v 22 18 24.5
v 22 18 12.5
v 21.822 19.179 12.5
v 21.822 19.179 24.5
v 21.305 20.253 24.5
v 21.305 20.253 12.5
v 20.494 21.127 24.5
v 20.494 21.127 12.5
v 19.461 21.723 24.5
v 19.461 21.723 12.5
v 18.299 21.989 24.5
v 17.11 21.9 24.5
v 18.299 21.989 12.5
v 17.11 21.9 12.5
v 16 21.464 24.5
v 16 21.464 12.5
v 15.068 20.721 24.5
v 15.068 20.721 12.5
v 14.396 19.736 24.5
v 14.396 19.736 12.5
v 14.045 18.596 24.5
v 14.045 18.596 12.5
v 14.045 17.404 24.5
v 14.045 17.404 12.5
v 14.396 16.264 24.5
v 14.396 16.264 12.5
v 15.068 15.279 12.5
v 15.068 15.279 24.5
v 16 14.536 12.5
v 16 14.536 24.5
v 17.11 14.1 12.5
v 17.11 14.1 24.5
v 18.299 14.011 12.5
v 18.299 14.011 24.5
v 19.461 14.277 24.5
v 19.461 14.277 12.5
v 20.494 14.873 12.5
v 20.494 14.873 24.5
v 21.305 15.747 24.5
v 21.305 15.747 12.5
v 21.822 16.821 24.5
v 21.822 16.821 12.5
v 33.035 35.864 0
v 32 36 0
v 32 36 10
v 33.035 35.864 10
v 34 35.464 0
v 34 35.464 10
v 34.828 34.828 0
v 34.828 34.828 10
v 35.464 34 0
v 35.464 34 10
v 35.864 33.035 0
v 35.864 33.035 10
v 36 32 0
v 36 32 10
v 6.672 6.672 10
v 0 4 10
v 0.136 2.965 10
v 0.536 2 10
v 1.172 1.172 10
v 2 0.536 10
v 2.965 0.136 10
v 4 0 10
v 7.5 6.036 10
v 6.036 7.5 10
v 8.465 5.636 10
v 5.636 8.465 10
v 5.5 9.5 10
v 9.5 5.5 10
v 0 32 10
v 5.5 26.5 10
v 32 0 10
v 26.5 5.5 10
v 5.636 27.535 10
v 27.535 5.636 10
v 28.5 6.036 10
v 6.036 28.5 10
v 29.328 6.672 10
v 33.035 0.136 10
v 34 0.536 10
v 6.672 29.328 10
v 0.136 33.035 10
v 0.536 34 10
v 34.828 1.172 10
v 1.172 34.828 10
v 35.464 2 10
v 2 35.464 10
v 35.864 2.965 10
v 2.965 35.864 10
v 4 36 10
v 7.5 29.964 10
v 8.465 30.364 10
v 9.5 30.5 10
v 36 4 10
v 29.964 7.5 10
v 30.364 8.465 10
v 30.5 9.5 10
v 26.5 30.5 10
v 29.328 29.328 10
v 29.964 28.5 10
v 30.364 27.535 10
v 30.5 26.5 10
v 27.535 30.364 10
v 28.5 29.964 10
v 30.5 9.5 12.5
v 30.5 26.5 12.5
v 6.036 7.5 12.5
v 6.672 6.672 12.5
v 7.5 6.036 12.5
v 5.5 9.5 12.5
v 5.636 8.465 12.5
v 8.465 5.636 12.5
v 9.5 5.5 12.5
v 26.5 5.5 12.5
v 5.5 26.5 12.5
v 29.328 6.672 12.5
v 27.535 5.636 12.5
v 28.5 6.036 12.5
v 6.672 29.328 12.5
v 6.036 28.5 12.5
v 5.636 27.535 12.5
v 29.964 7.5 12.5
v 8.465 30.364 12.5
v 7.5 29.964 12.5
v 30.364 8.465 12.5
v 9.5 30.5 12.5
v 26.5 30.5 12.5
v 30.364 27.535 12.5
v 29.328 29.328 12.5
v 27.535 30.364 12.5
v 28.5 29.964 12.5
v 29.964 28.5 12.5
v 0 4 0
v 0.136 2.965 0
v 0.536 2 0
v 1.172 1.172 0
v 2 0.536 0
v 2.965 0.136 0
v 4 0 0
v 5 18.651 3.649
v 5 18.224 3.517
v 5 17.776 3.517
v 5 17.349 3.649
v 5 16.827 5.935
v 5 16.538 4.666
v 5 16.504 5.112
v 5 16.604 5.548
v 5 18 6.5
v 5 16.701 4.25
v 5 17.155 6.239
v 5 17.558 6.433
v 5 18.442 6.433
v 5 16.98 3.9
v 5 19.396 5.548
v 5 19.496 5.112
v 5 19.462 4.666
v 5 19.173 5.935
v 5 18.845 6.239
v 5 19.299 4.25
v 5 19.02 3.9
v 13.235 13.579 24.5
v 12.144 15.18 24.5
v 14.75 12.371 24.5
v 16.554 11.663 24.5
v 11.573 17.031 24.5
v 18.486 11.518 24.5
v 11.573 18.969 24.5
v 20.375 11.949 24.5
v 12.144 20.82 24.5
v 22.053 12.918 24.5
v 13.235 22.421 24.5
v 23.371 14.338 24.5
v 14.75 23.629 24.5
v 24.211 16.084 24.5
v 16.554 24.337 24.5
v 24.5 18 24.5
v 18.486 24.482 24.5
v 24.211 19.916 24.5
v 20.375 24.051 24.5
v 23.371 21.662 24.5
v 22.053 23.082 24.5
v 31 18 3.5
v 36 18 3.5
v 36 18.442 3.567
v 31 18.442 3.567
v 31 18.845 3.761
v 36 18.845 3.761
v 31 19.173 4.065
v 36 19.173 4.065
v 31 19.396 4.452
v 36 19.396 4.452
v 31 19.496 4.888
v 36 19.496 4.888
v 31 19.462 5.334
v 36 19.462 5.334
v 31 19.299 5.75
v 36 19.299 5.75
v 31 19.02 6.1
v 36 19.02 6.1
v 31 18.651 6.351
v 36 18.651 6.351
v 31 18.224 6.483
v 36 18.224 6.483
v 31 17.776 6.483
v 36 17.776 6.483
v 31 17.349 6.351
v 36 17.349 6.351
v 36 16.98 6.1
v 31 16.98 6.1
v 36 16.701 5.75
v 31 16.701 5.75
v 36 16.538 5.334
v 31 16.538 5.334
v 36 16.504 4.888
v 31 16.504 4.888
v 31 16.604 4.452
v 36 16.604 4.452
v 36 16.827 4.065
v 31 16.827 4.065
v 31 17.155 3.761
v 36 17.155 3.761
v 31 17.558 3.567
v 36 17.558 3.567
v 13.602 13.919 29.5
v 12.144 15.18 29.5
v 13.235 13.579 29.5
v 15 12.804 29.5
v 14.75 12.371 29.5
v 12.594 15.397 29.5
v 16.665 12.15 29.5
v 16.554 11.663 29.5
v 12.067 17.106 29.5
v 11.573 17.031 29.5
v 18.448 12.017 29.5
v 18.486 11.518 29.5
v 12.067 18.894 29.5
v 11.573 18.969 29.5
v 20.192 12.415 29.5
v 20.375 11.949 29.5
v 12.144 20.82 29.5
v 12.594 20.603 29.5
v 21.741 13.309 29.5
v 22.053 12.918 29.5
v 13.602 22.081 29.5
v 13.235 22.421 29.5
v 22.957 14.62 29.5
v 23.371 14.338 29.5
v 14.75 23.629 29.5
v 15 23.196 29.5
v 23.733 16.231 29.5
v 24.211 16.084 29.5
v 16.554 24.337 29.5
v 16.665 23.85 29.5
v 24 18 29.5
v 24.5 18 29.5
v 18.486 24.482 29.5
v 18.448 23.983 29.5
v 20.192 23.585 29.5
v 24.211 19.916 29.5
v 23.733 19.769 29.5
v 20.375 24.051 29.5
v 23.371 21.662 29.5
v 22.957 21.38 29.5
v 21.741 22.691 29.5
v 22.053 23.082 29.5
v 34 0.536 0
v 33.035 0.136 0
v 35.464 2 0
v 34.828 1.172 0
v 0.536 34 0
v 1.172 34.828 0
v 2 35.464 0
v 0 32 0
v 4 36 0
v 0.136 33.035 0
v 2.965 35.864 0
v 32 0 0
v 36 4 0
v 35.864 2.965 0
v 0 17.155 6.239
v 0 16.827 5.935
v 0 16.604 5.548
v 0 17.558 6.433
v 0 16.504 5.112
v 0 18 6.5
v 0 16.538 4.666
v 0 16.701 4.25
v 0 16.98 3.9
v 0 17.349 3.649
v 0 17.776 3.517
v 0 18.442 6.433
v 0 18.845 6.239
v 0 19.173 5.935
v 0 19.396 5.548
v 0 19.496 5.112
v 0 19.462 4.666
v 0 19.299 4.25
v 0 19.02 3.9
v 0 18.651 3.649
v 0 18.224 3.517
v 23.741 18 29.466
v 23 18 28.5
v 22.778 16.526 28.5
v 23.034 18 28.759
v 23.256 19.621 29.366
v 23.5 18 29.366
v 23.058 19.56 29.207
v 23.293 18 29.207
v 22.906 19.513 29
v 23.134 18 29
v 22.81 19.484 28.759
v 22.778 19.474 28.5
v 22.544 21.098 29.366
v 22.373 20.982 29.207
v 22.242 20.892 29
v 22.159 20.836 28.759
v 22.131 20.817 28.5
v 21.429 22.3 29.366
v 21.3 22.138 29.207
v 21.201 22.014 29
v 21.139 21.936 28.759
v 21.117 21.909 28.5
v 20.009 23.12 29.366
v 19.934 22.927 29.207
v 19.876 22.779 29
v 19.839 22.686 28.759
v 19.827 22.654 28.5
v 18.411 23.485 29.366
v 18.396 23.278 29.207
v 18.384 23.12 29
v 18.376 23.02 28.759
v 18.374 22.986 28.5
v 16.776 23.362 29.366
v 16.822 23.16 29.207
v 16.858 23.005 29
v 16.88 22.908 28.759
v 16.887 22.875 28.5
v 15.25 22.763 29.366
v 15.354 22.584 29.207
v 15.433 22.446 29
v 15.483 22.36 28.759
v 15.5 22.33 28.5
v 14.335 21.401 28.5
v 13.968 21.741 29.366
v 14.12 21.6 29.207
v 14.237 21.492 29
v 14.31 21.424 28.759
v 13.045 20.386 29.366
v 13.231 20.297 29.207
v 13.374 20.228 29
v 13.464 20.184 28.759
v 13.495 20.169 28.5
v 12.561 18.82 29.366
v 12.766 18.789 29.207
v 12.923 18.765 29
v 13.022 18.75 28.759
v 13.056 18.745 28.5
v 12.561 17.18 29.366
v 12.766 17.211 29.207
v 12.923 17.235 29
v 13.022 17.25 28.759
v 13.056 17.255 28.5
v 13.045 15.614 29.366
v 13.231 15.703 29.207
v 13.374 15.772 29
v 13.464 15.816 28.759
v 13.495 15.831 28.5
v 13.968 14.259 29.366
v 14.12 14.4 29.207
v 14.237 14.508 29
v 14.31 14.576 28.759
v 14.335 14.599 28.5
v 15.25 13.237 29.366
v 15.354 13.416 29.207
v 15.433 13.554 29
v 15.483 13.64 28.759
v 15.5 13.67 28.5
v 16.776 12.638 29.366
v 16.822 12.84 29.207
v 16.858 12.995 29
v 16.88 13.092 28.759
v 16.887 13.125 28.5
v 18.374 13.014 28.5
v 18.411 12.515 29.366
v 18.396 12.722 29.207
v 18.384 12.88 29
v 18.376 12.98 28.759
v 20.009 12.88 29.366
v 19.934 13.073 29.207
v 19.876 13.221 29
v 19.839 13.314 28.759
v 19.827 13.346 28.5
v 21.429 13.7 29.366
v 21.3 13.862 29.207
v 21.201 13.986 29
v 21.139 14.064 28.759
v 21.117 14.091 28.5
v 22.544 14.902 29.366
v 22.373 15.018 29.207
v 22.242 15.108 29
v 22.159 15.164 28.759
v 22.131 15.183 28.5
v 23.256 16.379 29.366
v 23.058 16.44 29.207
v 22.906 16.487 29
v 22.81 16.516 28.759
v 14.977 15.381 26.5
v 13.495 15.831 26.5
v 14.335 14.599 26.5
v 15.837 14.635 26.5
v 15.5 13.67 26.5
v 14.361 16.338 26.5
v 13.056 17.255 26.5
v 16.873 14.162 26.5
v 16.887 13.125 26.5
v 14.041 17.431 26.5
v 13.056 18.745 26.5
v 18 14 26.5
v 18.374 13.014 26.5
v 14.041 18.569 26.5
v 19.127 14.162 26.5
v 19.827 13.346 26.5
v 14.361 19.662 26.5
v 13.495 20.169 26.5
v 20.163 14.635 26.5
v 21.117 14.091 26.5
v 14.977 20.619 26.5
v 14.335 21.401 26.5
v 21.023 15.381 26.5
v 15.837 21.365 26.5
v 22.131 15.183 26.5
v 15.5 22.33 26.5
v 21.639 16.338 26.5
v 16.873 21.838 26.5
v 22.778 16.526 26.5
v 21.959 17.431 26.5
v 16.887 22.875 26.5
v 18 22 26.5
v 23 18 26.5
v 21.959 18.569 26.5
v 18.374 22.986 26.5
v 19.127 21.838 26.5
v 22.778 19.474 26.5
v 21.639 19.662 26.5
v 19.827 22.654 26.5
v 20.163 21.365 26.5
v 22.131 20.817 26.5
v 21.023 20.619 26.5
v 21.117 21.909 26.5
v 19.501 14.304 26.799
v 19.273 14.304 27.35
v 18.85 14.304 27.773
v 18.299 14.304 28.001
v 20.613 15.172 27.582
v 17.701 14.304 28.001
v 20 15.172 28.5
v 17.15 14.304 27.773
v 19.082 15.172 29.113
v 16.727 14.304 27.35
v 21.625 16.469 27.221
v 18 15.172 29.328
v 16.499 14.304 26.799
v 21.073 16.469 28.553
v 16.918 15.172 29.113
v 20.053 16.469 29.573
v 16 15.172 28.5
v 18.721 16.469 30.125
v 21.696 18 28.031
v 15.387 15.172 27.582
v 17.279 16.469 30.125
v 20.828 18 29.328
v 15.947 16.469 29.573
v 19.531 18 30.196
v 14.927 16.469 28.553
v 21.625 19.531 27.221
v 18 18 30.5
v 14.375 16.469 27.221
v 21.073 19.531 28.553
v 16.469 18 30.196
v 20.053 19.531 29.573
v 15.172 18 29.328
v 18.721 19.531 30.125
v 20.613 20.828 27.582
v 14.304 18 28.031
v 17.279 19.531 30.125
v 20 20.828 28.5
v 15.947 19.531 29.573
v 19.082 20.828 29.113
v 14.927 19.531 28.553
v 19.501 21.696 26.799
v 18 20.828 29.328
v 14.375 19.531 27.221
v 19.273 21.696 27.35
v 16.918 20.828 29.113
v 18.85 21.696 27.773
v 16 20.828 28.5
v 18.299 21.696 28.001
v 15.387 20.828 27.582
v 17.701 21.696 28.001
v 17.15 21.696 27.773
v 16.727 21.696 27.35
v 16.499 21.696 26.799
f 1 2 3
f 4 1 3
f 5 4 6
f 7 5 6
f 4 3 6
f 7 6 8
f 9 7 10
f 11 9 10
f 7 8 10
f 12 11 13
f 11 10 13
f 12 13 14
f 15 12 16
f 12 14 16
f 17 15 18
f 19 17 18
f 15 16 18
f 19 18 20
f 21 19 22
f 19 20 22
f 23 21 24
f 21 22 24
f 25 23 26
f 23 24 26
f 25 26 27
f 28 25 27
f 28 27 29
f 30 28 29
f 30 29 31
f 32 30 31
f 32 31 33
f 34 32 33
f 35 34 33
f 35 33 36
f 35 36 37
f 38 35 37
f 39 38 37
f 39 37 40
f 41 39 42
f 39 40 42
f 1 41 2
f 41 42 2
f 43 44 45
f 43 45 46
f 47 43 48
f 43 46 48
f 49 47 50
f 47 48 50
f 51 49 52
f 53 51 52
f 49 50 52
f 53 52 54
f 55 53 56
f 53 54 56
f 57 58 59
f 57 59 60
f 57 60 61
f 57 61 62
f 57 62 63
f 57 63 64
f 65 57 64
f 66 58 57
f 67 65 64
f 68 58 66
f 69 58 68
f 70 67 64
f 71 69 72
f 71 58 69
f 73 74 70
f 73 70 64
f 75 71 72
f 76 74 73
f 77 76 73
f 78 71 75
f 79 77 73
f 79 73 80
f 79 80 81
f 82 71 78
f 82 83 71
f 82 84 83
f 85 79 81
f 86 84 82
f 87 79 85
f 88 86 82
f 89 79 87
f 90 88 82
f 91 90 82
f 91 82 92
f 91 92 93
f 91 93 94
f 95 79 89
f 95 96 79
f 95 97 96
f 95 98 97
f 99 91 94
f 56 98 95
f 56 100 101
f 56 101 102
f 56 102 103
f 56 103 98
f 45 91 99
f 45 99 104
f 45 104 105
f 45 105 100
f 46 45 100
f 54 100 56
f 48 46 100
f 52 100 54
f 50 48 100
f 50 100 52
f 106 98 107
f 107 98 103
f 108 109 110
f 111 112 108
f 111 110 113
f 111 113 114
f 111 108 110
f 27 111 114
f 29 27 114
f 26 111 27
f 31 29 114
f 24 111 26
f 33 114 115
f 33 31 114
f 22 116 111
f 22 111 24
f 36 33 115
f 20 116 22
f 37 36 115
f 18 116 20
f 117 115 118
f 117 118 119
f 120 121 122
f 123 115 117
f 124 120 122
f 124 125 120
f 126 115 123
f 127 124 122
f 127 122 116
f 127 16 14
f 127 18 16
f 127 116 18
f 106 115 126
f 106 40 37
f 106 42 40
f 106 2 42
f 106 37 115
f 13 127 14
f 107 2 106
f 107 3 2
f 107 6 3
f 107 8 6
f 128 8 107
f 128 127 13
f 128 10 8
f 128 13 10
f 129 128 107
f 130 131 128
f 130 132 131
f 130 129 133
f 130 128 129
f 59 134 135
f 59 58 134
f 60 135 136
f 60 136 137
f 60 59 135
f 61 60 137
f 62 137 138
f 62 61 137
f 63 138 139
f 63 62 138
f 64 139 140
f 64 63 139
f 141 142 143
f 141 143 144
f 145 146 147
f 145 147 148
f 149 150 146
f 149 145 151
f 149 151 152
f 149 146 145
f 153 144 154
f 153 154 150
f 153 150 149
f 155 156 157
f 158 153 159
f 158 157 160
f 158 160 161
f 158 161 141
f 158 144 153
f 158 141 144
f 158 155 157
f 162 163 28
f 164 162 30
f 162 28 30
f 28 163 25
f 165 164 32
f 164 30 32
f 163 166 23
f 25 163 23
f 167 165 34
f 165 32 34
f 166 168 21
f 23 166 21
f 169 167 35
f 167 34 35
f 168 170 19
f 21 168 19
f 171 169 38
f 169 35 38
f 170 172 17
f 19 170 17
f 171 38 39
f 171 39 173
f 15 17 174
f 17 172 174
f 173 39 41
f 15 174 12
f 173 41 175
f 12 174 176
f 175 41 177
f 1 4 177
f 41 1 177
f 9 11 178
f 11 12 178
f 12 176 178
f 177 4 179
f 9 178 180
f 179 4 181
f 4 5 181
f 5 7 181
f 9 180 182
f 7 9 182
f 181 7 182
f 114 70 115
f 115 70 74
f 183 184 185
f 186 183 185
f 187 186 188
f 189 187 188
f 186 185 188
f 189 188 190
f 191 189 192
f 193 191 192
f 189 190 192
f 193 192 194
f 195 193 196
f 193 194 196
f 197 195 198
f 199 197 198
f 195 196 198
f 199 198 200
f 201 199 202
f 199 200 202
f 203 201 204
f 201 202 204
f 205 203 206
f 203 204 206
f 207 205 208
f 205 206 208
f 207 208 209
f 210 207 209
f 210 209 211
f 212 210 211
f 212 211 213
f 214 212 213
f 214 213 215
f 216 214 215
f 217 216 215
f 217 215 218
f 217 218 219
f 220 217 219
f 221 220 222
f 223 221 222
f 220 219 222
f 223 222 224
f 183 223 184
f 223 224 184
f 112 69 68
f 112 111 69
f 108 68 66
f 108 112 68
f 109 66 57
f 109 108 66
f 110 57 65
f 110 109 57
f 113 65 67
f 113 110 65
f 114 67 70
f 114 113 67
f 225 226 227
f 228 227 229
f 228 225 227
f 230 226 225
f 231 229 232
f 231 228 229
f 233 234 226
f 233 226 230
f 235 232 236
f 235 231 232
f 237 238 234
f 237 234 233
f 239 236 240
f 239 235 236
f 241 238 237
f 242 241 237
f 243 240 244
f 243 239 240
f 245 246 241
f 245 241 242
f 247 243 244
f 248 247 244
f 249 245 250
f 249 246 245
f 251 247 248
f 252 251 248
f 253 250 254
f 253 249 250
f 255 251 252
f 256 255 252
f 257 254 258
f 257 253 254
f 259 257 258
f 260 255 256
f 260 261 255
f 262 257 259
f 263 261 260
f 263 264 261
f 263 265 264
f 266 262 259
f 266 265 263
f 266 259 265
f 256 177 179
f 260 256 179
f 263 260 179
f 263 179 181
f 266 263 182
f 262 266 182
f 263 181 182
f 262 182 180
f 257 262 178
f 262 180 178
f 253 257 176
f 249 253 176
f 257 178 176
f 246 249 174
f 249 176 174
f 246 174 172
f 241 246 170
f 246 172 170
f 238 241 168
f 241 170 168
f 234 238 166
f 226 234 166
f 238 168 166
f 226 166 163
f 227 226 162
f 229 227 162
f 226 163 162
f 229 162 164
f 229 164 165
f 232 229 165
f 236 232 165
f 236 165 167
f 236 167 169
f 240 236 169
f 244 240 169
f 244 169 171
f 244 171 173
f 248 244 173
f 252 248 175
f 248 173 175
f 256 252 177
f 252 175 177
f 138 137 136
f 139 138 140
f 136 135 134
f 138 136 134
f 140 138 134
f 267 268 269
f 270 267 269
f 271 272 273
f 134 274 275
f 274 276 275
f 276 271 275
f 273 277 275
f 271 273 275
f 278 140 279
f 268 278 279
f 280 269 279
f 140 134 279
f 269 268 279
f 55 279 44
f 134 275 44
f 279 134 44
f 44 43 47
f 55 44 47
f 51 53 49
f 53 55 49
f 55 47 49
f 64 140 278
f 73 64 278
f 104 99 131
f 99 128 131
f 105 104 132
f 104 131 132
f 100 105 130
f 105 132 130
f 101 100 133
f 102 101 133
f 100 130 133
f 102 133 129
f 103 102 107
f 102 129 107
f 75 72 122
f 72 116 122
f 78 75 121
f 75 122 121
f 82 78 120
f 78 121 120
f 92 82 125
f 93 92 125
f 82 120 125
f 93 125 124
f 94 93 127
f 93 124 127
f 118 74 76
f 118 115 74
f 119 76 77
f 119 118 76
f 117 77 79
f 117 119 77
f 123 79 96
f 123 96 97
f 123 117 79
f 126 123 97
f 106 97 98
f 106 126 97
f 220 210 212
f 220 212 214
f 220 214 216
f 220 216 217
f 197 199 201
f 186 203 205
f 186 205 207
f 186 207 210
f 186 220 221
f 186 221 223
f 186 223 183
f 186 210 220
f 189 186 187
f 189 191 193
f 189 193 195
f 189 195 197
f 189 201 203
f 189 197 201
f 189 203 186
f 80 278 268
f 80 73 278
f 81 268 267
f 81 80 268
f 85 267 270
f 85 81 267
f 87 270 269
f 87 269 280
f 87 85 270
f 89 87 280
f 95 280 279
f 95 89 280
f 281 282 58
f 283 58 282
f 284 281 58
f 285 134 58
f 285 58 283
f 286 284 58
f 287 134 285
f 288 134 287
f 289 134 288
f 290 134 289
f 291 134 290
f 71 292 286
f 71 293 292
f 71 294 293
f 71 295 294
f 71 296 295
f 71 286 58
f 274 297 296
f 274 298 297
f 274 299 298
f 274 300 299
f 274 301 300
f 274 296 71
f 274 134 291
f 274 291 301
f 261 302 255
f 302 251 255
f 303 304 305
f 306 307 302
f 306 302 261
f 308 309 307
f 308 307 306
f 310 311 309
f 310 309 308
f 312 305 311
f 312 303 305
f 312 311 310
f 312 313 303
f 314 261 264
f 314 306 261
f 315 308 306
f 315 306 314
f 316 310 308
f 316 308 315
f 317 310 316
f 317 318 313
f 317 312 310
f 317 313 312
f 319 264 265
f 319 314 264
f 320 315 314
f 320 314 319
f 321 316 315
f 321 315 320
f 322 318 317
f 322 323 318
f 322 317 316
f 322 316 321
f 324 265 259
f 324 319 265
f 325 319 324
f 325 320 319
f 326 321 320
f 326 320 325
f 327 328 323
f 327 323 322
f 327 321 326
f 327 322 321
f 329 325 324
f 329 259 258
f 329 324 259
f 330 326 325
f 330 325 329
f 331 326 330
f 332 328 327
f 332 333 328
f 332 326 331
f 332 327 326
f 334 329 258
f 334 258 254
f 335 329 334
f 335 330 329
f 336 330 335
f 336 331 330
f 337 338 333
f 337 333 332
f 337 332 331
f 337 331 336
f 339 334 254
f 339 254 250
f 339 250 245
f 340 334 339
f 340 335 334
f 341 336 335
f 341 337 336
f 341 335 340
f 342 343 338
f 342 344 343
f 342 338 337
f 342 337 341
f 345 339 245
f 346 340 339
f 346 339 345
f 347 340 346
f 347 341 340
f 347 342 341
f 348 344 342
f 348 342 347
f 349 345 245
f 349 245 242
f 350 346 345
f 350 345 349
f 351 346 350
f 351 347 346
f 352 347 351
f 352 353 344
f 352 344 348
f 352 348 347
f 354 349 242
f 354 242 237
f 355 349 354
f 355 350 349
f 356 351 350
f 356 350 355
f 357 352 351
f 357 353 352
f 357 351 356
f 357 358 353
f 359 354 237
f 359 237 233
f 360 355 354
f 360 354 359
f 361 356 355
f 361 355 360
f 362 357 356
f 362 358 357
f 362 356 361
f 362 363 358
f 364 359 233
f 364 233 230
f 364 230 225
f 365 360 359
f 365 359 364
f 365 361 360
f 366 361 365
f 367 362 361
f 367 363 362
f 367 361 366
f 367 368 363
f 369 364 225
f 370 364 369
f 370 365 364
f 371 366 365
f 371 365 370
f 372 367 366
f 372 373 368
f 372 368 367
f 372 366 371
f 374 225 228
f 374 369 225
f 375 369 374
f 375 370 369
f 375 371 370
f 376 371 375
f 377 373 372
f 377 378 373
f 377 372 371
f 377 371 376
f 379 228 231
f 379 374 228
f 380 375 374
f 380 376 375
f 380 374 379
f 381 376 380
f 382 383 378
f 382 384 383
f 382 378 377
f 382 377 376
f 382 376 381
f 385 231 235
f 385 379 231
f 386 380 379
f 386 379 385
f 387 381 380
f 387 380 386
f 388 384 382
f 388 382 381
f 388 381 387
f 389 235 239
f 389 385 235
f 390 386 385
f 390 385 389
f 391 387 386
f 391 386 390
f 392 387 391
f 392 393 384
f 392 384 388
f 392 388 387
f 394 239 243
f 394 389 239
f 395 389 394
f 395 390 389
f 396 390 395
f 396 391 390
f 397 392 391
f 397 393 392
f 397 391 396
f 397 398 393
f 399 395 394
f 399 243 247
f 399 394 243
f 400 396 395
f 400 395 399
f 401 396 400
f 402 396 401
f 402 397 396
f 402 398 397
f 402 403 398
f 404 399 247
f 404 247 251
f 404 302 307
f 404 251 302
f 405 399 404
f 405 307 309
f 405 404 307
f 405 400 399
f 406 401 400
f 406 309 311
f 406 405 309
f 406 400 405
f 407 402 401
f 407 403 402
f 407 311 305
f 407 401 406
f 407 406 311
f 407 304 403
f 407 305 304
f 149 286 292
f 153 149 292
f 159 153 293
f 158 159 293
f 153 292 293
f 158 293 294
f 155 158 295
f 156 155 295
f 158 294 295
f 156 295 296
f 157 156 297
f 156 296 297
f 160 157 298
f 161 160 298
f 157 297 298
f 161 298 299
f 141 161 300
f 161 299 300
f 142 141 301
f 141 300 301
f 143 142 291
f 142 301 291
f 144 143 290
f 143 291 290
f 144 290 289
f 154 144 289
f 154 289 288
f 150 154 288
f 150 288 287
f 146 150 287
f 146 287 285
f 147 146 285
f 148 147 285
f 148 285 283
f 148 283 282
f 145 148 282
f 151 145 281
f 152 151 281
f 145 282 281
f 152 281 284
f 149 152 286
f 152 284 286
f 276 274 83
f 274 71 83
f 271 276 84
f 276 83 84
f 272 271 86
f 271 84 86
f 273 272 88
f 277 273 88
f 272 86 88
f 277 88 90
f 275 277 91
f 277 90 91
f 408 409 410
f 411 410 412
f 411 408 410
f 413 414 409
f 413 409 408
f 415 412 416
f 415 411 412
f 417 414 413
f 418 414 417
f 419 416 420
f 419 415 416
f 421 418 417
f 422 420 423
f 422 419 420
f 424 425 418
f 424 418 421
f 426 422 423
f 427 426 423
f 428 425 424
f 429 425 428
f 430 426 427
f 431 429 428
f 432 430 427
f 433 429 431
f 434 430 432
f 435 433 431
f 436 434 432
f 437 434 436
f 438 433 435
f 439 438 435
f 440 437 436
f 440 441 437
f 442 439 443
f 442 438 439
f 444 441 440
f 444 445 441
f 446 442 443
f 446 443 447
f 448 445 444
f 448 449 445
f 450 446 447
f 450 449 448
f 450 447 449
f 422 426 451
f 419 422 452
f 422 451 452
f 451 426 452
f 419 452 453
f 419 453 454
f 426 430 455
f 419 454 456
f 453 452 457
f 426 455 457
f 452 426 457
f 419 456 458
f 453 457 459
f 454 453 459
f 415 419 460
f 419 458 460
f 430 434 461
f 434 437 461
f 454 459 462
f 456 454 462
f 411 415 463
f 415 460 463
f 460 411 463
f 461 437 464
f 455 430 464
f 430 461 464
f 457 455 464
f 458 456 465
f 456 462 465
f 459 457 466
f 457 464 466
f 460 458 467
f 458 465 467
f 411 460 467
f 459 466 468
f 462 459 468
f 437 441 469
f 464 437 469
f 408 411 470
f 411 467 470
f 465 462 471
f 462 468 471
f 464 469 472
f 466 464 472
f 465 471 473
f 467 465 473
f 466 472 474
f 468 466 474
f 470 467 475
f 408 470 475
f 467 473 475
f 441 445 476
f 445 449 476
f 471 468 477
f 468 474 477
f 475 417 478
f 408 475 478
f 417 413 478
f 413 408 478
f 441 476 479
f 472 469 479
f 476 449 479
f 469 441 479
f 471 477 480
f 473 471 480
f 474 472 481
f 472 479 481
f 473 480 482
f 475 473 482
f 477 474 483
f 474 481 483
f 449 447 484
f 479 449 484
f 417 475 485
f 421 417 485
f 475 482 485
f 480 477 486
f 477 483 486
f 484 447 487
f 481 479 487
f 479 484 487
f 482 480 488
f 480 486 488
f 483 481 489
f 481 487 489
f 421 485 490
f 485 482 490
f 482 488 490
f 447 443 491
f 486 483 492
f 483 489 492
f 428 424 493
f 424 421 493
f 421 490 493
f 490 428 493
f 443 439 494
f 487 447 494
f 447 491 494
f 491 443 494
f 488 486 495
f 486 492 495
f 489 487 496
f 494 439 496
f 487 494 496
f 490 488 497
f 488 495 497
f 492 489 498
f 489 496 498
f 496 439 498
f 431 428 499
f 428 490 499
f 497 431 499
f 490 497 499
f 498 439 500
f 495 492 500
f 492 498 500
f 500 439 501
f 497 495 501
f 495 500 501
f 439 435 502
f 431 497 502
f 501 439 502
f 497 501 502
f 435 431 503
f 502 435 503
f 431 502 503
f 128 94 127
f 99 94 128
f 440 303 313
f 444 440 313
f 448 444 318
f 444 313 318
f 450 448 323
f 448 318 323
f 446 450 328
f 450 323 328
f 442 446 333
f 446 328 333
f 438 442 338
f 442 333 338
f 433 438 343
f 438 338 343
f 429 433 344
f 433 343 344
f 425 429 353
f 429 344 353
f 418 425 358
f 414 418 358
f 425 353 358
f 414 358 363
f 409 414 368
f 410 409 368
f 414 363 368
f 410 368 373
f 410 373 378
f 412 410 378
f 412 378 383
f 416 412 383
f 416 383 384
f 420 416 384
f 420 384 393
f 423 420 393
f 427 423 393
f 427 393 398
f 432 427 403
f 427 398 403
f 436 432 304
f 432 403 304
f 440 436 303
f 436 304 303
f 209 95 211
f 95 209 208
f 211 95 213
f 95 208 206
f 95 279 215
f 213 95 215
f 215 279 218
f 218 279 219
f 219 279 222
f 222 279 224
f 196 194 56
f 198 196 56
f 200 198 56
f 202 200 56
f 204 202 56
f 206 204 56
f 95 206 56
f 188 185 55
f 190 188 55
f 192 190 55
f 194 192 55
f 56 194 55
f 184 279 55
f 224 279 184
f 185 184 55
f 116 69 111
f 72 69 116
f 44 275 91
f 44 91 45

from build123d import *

# Parameters (mm, degrees)
SKETCH1_W           = 36
SKETCH1_H           = 36
BOSS_EXTRUDE1_DEPTH = 10
SKETCH2_W           = 25
SKETCH2_H           = 25
BOSS_EXTRUDE2_DEPTH = 2.5
SKETCH3_R           = 4
BOSS_EXTRUDE3_DEPTH = 12
SKETCH4_R           = 6.5
BOSS_EXTRUDE4_DEPTH = 5
SKETCH5_R           = 5
CUT_EXTRUDE1_DEPTH  = 3
FILLET1_R           = 4
FILLET2_R           = 4
SKETCH7_R           = 1.5
CUT_EXTRUDE2_DEPTH  = 5
SKETCH8_R           = 1.5
CUT_EXTRUDE3_DEPTH  = 5
FILLET3_R           = 1


with BuildPart() as part:
    # Sketch1 → Boss-Extrude1 (new body)
    with BuildSketch(Plane.XY):
        with Locations((18, 18)):
            Rectangle(SKETCH1_W, SKETCH1_H)
    extrude(amount=BOSS_EXTRUDE1_DEPTH)

    # Sketch2 → Boss-Extrude2 (add)
    with BuildSketch(Plane.XY.offset(10)):
        with Locations((18, 18)):
            Rectangle(SKETCH2_W, SKETCH2_H)
    extrude(amount=BOSS_EXTRUDE2_DEPTH)

    # Sketch3 → Boss-Extrude3 (add)
    with BuildSketch(Plane.XY.offset(12.5)):
        with Locations((18, 18)):
            Circle(SKETCH3_R)
    extrude(amount=BOSS_EXTRUDE3_DEPTH)

    # Sketch4 → Boss-Extrude4 (add)
    with BuildSketch(Plane.XY.offset(24.5)):
        with Locations((18, 18)):
            Circle(SKETCH4_R)
    extrude(amount=BOSS_EXTRUDE4_DEPTH)

    # Sketch5 → Cut-Extrude1 (cut)
    with BuildSketch(Plane.XY.offset(29.5)):
        with Locations((18, 18)):
            Circle(SKETCH5_R)
    extrude(amount=-CUT_EXTRUDE1_DEPTH, mode=Mode.SUBTRACT)

    # Sketch6 → Revolve4 (revolve)
    with BuildSketch(Plane.XY.offset(26.5)):
        with BuildLine():
            Line((18, 22), (18, 14))
            ThreePointArc((18, 14), (22, 18), (18, 22))
        make_face()
    revolve(axis=Axis((18, 22, 26.5), (0, -1, 0)))

    # Fillet1
    fillet1_edges = [part.edges().sort_by_distance(p)[0] for p in [
        (30.5, 5.5, 11.25),
        (30.5, 30.5, 11.25),
        (5.5, 30.5, 11.25),
        (5.5, 5.5, 11.25),
    ]]
    fillet(fillet1_edges, radius=FILLET1_R)

    # Fillet2
    fillet2_edges = [part.edges().sort_by_distance(p)[0] for p in [
        (0, 36, 5),
        (36, 36, 5),
        (36, 0, 5),
        (0, 0, 5),
    ]]
    fillet(fillet2_edges, radius=FILLET2_R)

    # Sketch7 → Cut-Extrude2 (cut)
    with BuildSketch(Plane(origin=(36, 0, 0), x_dir=(0, 0, -1), z_dir=(1, 0, 0))):
        with Locations((-5, 18)):
            Circle(SKETCH7_R)
    extrude(amount=-CUT_EXTRUDE2_DEPTH, mode=Mode.SUBTRACT)

    # Sketch8 → Cut-Extrude3 (cut)
    with BuildSketch(Plane.ZY):
        with Locations((5, 18)):
            Circle(SKETCH8_R)
    extrude(amount=-CUT_EXTRUDE3_DEPTH, mode=Mode.SUBTRACT)

    # Fillet3
    fillet3_edges = [part.edges().sort_by_distance(p)[0] for p in [
        (13, 18, 29.5),
    ]]
    fillet(fillet3_edges, radius=FILLET3_R)


solid = part.part
